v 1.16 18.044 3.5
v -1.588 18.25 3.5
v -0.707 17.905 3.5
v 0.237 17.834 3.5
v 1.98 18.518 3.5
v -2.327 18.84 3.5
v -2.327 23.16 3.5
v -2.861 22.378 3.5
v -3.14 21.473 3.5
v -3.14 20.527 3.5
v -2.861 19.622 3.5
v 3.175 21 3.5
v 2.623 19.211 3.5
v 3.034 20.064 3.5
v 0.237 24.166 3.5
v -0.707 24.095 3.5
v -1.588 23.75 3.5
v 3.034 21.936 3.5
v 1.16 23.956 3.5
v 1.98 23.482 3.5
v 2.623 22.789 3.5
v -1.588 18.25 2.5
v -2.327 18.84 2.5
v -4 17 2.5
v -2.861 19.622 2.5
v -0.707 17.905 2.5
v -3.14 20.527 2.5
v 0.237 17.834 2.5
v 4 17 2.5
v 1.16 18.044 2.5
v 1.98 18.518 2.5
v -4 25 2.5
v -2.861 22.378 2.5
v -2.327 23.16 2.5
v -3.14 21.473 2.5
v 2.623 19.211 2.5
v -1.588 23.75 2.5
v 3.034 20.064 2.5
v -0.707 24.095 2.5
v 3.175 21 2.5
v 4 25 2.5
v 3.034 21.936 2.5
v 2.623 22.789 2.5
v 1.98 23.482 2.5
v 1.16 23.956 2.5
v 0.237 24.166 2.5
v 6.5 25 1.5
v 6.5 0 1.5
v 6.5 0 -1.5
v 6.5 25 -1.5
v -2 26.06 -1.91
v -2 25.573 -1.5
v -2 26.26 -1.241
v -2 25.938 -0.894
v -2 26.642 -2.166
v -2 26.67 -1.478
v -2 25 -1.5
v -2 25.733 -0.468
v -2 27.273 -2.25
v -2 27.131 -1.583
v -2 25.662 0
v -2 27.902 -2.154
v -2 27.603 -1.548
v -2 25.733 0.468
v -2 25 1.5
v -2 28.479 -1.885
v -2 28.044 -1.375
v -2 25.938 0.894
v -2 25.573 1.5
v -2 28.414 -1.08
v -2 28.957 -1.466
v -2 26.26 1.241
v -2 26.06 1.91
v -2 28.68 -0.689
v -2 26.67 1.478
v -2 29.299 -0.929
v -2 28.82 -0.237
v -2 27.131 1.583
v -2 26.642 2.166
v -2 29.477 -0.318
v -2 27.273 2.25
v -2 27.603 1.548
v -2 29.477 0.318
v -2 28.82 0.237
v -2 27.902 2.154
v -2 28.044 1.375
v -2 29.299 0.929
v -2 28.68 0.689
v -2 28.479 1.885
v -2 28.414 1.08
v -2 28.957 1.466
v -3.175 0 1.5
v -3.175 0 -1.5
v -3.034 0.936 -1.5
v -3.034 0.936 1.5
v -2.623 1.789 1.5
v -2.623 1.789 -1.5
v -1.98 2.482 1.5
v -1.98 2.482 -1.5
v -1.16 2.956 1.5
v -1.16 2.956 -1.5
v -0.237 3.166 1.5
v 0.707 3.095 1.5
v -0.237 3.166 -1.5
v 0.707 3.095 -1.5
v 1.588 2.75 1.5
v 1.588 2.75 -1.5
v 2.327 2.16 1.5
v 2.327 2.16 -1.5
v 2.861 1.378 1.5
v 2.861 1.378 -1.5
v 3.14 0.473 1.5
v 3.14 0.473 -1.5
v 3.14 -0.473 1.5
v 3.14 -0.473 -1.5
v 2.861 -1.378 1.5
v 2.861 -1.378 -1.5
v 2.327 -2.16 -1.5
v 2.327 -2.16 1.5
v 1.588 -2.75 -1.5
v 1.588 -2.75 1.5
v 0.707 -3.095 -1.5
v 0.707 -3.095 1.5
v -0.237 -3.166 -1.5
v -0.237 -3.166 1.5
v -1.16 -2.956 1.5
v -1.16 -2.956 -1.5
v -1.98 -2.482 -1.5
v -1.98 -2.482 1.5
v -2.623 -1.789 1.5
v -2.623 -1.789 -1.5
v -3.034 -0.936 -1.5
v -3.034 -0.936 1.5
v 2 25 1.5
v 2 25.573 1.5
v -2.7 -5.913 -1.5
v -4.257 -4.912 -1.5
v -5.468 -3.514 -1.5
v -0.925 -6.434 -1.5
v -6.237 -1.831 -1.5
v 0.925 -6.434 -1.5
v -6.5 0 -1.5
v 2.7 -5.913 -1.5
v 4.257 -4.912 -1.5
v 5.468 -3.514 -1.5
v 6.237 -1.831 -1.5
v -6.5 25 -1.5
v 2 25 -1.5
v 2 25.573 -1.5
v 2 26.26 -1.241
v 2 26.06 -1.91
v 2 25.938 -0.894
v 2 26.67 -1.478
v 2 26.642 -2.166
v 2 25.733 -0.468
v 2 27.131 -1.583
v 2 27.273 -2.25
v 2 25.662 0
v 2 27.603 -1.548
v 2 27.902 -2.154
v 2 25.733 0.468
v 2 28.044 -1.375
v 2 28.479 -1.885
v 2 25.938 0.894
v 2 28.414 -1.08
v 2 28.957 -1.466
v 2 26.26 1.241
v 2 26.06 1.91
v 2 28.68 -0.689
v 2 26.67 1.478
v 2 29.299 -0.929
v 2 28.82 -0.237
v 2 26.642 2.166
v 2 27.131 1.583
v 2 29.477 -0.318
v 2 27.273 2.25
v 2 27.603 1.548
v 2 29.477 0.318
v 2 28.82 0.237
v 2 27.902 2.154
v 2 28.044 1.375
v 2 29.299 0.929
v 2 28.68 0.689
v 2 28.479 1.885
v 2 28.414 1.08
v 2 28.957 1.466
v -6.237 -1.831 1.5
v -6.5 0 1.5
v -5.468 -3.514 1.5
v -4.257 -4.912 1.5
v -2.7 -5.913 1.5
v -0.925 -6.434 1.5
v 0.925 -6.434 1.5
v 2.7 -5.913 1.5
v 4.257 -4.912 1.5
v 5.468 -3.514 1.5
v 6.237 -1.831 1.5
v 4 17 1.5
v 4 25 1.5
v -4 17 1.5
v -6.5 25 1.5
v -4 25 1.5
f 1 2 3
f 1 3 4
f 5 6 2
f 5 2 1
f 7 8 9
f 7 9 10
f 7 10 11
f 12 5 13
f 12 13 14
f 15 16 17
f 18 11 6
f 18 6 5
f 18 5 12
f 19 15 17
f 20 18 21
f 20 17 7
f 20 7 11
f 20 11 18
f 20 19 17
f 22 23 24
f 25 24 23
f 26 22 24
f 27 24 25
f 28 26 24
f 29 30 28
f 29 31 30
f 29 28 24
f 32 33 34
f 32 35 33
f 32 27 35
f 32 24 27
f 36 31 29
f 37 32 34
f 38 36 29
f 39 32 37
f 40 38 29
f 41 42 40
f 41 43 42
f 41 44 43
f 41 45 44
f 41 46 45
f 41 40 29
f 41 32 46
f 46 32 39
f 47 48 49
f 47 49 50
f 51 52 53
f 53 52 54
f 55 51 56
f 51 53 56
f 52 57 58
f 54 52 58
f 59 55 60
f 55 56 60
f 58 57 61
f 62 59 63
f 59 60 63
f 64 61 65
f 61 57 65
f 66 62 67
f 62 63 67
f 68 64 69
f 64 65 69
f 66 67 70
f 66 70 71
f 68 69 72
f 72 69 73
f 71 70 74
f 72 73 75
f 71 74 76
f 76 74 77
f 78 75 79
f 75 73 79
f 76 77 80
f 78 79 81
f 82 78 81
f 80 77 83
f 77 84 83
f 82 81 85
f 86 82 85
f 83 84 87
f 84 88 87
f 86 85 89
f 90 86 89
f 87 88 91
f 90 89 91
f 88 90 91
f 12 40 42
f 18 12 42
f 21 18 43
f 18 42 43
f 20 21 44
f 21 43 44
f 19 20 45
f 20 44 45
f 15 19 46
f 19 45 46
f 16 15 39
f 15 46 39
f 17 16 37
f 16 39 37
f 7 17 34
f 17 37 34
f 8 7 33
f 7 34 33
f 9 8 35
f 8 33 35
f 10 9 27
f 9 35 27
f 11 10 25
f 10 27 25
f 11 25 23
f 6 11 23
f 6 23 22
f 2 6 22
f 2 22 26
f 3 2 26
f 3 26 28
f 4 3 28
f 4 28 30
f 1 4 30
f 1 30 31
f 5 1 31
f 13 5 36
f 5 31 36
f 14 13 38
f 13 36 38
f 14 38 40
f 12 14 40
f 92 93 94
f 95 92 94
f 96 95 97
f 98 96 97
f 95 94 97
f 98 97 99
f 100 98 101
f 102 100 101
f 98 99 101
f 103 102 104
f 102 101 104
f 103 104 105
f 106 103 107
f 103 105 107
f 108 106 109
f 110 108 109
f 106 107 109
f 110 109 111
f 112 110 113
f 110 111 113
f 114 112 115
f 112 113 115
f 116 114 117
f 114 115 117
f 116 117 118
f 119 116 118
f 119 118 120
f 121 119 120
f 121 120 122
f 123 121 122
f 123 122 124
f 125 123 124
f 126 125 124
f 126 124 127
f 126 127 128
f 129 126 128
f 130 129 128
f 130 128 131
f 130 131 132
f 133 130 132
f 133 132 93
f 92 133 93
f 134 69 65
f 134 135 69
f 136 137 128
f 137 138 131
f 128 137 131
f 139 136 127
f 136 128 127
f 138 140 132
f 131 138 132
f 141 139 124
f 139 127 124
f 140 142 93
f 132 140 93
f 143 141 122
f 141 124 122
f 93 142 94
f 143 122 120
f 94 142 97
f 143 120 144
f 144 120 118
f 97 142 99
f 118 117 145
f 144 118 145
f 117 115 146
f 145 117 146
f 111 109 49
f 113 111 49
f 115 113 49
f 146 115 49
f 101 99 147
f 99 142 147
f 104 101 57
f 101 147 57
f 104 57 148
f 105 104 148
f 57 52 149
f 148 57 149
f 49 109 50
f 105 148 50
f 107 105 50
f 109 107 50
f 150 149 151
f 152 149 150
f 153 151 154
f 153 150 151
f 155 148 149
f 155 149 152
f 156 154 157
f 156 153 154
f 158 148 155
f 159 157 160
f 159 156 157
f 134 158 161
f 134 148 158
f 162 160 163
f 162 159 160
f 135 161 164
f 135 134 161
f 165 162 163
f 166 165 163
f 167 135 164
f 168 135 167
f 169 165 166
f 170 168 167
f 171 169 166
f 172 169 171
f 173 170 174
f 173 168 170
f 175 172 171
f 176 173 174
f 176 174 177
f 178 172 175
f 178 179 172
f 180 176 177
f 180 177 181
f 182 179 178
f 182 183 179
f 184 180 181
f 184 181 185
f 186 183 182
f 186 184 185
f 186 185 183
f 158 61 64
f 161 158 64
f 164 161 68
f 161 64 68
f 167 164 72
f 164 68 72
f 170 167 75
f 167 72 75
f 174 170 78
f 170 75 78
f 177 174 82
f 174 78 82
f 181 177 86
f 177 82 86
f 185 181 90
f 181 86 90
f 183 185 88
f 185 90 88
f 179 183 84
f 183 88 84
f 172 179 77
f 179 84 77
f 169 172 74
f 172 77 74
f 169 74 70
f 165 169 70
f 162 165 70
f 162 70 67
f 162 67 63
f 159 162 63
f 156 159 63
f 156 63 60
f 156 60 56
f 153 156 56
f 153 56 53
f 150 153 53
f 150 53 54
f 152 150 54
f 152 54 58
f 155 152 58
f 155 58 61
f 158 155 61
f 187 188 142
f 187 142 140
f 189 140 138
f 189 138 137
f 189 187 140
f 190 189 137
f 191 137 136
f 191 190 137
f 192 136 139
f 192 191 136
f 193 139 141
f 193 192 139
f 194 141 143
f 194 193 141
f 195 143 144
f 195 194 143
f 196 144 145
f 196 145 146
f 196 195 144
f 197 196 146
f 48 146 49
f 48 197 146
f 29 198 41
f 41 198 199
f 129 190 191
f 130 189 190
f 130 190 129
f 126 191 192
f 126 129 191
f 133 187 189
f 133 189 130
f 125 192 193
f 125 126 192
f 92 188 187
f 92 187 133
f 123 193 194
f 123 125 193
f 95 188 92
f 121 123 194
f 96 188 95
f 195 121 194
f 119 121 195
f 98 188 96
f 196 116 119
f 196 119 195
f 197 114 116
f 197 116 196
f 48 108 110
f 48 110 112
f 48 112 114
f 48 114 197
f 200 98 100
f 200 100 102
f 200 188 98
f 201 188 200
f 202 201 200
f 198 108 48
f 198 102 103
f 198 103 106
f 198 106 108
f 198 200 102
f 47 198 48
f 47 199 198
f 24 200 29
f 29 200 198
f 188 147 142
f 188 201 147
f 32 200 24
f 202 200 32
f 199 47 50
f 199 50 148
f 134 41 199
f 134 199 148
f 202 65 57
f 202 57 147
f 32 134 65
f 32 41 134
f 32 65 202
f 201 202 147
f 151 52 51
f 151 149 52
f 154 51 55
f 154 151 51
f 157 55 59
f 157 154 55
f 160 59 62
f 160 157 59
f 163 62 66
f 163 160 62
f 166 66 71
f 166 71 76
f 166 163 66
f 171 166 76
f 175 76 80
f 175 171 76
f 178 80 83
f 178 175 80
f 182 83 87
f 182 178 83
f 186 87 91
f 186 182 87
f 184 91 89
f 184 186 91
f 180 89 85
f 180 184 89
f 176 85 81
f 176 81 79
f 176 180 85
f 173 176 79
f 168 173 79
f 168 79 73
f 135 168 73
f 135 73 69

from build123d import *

# Parameters (mm, degrees)
F1_DEPTH = 1.5
F2_W     = 8
F2_H     = 8
F3_DEPTH = 1
F4_R     = 3.175
F5_DEPTH = 1
F7_DEPTH = 2
F9_D     = 3.175
F11_D    = 6.35


with BuildPart() as f1:
    # F0 (on Top) → F1 (new body, symmetric)
    with BuildSketch(Plane.XY):
        with BuildLine():
            Line((-6.5, 25), (-6.5, 0))
            ThreePointArc((-6.5, 0), (0, -6.5), (6.5, 0))
            Line((6.5, 0), (6.5, 25))
            Line((6.5, 25), (-6.5, 25))
        make_face()
    extrude(amount=F1_DEPTH, both=True)

    # F2 (on face) → F3 (join)
    with BuildSketch(Plane.XY.offset(1.5)):
        with Locations((0, 21)):
            Rectangle(F2_W, F2_H)
    extrude(amount=F3_DEPTH)

    # F4 (on face) → F5 (join)
    with BuildSketch(Plane.XY.offset(2.5)):
        with Locations((0, 21)):
            Circle(F4_R)
    extrude(amount=F5_DEPTH)

    # F6 (on Right) → F7 (join, symmetric)
    with BuildSketch(Plane.YZ):
        with BuildLine():
            Line((25.572949, 1.5), (25, 1.5))
            Line((25, 1.5), (25, -1.5))
            Line((25, -1.5), (25.572949, -1.5))
            ThreePointArc((25.572949, -1.5), (29.5, 0), (25.572949, 1.5))
        make_face()
    extrude(amount=F7_DEPTH, both=True)

    # F9 (through all)
    with Locations(Plane.YZ.offset(2)):
        with Locations((27.25, 0)):
            Hole(F9_D / 2)

    # F11 (through all)
    with Locations(Plane.XY.offset(1.5)):
        with Locations((0, 0)):
            Hole(F11_D / 2)


solid = f1.part
